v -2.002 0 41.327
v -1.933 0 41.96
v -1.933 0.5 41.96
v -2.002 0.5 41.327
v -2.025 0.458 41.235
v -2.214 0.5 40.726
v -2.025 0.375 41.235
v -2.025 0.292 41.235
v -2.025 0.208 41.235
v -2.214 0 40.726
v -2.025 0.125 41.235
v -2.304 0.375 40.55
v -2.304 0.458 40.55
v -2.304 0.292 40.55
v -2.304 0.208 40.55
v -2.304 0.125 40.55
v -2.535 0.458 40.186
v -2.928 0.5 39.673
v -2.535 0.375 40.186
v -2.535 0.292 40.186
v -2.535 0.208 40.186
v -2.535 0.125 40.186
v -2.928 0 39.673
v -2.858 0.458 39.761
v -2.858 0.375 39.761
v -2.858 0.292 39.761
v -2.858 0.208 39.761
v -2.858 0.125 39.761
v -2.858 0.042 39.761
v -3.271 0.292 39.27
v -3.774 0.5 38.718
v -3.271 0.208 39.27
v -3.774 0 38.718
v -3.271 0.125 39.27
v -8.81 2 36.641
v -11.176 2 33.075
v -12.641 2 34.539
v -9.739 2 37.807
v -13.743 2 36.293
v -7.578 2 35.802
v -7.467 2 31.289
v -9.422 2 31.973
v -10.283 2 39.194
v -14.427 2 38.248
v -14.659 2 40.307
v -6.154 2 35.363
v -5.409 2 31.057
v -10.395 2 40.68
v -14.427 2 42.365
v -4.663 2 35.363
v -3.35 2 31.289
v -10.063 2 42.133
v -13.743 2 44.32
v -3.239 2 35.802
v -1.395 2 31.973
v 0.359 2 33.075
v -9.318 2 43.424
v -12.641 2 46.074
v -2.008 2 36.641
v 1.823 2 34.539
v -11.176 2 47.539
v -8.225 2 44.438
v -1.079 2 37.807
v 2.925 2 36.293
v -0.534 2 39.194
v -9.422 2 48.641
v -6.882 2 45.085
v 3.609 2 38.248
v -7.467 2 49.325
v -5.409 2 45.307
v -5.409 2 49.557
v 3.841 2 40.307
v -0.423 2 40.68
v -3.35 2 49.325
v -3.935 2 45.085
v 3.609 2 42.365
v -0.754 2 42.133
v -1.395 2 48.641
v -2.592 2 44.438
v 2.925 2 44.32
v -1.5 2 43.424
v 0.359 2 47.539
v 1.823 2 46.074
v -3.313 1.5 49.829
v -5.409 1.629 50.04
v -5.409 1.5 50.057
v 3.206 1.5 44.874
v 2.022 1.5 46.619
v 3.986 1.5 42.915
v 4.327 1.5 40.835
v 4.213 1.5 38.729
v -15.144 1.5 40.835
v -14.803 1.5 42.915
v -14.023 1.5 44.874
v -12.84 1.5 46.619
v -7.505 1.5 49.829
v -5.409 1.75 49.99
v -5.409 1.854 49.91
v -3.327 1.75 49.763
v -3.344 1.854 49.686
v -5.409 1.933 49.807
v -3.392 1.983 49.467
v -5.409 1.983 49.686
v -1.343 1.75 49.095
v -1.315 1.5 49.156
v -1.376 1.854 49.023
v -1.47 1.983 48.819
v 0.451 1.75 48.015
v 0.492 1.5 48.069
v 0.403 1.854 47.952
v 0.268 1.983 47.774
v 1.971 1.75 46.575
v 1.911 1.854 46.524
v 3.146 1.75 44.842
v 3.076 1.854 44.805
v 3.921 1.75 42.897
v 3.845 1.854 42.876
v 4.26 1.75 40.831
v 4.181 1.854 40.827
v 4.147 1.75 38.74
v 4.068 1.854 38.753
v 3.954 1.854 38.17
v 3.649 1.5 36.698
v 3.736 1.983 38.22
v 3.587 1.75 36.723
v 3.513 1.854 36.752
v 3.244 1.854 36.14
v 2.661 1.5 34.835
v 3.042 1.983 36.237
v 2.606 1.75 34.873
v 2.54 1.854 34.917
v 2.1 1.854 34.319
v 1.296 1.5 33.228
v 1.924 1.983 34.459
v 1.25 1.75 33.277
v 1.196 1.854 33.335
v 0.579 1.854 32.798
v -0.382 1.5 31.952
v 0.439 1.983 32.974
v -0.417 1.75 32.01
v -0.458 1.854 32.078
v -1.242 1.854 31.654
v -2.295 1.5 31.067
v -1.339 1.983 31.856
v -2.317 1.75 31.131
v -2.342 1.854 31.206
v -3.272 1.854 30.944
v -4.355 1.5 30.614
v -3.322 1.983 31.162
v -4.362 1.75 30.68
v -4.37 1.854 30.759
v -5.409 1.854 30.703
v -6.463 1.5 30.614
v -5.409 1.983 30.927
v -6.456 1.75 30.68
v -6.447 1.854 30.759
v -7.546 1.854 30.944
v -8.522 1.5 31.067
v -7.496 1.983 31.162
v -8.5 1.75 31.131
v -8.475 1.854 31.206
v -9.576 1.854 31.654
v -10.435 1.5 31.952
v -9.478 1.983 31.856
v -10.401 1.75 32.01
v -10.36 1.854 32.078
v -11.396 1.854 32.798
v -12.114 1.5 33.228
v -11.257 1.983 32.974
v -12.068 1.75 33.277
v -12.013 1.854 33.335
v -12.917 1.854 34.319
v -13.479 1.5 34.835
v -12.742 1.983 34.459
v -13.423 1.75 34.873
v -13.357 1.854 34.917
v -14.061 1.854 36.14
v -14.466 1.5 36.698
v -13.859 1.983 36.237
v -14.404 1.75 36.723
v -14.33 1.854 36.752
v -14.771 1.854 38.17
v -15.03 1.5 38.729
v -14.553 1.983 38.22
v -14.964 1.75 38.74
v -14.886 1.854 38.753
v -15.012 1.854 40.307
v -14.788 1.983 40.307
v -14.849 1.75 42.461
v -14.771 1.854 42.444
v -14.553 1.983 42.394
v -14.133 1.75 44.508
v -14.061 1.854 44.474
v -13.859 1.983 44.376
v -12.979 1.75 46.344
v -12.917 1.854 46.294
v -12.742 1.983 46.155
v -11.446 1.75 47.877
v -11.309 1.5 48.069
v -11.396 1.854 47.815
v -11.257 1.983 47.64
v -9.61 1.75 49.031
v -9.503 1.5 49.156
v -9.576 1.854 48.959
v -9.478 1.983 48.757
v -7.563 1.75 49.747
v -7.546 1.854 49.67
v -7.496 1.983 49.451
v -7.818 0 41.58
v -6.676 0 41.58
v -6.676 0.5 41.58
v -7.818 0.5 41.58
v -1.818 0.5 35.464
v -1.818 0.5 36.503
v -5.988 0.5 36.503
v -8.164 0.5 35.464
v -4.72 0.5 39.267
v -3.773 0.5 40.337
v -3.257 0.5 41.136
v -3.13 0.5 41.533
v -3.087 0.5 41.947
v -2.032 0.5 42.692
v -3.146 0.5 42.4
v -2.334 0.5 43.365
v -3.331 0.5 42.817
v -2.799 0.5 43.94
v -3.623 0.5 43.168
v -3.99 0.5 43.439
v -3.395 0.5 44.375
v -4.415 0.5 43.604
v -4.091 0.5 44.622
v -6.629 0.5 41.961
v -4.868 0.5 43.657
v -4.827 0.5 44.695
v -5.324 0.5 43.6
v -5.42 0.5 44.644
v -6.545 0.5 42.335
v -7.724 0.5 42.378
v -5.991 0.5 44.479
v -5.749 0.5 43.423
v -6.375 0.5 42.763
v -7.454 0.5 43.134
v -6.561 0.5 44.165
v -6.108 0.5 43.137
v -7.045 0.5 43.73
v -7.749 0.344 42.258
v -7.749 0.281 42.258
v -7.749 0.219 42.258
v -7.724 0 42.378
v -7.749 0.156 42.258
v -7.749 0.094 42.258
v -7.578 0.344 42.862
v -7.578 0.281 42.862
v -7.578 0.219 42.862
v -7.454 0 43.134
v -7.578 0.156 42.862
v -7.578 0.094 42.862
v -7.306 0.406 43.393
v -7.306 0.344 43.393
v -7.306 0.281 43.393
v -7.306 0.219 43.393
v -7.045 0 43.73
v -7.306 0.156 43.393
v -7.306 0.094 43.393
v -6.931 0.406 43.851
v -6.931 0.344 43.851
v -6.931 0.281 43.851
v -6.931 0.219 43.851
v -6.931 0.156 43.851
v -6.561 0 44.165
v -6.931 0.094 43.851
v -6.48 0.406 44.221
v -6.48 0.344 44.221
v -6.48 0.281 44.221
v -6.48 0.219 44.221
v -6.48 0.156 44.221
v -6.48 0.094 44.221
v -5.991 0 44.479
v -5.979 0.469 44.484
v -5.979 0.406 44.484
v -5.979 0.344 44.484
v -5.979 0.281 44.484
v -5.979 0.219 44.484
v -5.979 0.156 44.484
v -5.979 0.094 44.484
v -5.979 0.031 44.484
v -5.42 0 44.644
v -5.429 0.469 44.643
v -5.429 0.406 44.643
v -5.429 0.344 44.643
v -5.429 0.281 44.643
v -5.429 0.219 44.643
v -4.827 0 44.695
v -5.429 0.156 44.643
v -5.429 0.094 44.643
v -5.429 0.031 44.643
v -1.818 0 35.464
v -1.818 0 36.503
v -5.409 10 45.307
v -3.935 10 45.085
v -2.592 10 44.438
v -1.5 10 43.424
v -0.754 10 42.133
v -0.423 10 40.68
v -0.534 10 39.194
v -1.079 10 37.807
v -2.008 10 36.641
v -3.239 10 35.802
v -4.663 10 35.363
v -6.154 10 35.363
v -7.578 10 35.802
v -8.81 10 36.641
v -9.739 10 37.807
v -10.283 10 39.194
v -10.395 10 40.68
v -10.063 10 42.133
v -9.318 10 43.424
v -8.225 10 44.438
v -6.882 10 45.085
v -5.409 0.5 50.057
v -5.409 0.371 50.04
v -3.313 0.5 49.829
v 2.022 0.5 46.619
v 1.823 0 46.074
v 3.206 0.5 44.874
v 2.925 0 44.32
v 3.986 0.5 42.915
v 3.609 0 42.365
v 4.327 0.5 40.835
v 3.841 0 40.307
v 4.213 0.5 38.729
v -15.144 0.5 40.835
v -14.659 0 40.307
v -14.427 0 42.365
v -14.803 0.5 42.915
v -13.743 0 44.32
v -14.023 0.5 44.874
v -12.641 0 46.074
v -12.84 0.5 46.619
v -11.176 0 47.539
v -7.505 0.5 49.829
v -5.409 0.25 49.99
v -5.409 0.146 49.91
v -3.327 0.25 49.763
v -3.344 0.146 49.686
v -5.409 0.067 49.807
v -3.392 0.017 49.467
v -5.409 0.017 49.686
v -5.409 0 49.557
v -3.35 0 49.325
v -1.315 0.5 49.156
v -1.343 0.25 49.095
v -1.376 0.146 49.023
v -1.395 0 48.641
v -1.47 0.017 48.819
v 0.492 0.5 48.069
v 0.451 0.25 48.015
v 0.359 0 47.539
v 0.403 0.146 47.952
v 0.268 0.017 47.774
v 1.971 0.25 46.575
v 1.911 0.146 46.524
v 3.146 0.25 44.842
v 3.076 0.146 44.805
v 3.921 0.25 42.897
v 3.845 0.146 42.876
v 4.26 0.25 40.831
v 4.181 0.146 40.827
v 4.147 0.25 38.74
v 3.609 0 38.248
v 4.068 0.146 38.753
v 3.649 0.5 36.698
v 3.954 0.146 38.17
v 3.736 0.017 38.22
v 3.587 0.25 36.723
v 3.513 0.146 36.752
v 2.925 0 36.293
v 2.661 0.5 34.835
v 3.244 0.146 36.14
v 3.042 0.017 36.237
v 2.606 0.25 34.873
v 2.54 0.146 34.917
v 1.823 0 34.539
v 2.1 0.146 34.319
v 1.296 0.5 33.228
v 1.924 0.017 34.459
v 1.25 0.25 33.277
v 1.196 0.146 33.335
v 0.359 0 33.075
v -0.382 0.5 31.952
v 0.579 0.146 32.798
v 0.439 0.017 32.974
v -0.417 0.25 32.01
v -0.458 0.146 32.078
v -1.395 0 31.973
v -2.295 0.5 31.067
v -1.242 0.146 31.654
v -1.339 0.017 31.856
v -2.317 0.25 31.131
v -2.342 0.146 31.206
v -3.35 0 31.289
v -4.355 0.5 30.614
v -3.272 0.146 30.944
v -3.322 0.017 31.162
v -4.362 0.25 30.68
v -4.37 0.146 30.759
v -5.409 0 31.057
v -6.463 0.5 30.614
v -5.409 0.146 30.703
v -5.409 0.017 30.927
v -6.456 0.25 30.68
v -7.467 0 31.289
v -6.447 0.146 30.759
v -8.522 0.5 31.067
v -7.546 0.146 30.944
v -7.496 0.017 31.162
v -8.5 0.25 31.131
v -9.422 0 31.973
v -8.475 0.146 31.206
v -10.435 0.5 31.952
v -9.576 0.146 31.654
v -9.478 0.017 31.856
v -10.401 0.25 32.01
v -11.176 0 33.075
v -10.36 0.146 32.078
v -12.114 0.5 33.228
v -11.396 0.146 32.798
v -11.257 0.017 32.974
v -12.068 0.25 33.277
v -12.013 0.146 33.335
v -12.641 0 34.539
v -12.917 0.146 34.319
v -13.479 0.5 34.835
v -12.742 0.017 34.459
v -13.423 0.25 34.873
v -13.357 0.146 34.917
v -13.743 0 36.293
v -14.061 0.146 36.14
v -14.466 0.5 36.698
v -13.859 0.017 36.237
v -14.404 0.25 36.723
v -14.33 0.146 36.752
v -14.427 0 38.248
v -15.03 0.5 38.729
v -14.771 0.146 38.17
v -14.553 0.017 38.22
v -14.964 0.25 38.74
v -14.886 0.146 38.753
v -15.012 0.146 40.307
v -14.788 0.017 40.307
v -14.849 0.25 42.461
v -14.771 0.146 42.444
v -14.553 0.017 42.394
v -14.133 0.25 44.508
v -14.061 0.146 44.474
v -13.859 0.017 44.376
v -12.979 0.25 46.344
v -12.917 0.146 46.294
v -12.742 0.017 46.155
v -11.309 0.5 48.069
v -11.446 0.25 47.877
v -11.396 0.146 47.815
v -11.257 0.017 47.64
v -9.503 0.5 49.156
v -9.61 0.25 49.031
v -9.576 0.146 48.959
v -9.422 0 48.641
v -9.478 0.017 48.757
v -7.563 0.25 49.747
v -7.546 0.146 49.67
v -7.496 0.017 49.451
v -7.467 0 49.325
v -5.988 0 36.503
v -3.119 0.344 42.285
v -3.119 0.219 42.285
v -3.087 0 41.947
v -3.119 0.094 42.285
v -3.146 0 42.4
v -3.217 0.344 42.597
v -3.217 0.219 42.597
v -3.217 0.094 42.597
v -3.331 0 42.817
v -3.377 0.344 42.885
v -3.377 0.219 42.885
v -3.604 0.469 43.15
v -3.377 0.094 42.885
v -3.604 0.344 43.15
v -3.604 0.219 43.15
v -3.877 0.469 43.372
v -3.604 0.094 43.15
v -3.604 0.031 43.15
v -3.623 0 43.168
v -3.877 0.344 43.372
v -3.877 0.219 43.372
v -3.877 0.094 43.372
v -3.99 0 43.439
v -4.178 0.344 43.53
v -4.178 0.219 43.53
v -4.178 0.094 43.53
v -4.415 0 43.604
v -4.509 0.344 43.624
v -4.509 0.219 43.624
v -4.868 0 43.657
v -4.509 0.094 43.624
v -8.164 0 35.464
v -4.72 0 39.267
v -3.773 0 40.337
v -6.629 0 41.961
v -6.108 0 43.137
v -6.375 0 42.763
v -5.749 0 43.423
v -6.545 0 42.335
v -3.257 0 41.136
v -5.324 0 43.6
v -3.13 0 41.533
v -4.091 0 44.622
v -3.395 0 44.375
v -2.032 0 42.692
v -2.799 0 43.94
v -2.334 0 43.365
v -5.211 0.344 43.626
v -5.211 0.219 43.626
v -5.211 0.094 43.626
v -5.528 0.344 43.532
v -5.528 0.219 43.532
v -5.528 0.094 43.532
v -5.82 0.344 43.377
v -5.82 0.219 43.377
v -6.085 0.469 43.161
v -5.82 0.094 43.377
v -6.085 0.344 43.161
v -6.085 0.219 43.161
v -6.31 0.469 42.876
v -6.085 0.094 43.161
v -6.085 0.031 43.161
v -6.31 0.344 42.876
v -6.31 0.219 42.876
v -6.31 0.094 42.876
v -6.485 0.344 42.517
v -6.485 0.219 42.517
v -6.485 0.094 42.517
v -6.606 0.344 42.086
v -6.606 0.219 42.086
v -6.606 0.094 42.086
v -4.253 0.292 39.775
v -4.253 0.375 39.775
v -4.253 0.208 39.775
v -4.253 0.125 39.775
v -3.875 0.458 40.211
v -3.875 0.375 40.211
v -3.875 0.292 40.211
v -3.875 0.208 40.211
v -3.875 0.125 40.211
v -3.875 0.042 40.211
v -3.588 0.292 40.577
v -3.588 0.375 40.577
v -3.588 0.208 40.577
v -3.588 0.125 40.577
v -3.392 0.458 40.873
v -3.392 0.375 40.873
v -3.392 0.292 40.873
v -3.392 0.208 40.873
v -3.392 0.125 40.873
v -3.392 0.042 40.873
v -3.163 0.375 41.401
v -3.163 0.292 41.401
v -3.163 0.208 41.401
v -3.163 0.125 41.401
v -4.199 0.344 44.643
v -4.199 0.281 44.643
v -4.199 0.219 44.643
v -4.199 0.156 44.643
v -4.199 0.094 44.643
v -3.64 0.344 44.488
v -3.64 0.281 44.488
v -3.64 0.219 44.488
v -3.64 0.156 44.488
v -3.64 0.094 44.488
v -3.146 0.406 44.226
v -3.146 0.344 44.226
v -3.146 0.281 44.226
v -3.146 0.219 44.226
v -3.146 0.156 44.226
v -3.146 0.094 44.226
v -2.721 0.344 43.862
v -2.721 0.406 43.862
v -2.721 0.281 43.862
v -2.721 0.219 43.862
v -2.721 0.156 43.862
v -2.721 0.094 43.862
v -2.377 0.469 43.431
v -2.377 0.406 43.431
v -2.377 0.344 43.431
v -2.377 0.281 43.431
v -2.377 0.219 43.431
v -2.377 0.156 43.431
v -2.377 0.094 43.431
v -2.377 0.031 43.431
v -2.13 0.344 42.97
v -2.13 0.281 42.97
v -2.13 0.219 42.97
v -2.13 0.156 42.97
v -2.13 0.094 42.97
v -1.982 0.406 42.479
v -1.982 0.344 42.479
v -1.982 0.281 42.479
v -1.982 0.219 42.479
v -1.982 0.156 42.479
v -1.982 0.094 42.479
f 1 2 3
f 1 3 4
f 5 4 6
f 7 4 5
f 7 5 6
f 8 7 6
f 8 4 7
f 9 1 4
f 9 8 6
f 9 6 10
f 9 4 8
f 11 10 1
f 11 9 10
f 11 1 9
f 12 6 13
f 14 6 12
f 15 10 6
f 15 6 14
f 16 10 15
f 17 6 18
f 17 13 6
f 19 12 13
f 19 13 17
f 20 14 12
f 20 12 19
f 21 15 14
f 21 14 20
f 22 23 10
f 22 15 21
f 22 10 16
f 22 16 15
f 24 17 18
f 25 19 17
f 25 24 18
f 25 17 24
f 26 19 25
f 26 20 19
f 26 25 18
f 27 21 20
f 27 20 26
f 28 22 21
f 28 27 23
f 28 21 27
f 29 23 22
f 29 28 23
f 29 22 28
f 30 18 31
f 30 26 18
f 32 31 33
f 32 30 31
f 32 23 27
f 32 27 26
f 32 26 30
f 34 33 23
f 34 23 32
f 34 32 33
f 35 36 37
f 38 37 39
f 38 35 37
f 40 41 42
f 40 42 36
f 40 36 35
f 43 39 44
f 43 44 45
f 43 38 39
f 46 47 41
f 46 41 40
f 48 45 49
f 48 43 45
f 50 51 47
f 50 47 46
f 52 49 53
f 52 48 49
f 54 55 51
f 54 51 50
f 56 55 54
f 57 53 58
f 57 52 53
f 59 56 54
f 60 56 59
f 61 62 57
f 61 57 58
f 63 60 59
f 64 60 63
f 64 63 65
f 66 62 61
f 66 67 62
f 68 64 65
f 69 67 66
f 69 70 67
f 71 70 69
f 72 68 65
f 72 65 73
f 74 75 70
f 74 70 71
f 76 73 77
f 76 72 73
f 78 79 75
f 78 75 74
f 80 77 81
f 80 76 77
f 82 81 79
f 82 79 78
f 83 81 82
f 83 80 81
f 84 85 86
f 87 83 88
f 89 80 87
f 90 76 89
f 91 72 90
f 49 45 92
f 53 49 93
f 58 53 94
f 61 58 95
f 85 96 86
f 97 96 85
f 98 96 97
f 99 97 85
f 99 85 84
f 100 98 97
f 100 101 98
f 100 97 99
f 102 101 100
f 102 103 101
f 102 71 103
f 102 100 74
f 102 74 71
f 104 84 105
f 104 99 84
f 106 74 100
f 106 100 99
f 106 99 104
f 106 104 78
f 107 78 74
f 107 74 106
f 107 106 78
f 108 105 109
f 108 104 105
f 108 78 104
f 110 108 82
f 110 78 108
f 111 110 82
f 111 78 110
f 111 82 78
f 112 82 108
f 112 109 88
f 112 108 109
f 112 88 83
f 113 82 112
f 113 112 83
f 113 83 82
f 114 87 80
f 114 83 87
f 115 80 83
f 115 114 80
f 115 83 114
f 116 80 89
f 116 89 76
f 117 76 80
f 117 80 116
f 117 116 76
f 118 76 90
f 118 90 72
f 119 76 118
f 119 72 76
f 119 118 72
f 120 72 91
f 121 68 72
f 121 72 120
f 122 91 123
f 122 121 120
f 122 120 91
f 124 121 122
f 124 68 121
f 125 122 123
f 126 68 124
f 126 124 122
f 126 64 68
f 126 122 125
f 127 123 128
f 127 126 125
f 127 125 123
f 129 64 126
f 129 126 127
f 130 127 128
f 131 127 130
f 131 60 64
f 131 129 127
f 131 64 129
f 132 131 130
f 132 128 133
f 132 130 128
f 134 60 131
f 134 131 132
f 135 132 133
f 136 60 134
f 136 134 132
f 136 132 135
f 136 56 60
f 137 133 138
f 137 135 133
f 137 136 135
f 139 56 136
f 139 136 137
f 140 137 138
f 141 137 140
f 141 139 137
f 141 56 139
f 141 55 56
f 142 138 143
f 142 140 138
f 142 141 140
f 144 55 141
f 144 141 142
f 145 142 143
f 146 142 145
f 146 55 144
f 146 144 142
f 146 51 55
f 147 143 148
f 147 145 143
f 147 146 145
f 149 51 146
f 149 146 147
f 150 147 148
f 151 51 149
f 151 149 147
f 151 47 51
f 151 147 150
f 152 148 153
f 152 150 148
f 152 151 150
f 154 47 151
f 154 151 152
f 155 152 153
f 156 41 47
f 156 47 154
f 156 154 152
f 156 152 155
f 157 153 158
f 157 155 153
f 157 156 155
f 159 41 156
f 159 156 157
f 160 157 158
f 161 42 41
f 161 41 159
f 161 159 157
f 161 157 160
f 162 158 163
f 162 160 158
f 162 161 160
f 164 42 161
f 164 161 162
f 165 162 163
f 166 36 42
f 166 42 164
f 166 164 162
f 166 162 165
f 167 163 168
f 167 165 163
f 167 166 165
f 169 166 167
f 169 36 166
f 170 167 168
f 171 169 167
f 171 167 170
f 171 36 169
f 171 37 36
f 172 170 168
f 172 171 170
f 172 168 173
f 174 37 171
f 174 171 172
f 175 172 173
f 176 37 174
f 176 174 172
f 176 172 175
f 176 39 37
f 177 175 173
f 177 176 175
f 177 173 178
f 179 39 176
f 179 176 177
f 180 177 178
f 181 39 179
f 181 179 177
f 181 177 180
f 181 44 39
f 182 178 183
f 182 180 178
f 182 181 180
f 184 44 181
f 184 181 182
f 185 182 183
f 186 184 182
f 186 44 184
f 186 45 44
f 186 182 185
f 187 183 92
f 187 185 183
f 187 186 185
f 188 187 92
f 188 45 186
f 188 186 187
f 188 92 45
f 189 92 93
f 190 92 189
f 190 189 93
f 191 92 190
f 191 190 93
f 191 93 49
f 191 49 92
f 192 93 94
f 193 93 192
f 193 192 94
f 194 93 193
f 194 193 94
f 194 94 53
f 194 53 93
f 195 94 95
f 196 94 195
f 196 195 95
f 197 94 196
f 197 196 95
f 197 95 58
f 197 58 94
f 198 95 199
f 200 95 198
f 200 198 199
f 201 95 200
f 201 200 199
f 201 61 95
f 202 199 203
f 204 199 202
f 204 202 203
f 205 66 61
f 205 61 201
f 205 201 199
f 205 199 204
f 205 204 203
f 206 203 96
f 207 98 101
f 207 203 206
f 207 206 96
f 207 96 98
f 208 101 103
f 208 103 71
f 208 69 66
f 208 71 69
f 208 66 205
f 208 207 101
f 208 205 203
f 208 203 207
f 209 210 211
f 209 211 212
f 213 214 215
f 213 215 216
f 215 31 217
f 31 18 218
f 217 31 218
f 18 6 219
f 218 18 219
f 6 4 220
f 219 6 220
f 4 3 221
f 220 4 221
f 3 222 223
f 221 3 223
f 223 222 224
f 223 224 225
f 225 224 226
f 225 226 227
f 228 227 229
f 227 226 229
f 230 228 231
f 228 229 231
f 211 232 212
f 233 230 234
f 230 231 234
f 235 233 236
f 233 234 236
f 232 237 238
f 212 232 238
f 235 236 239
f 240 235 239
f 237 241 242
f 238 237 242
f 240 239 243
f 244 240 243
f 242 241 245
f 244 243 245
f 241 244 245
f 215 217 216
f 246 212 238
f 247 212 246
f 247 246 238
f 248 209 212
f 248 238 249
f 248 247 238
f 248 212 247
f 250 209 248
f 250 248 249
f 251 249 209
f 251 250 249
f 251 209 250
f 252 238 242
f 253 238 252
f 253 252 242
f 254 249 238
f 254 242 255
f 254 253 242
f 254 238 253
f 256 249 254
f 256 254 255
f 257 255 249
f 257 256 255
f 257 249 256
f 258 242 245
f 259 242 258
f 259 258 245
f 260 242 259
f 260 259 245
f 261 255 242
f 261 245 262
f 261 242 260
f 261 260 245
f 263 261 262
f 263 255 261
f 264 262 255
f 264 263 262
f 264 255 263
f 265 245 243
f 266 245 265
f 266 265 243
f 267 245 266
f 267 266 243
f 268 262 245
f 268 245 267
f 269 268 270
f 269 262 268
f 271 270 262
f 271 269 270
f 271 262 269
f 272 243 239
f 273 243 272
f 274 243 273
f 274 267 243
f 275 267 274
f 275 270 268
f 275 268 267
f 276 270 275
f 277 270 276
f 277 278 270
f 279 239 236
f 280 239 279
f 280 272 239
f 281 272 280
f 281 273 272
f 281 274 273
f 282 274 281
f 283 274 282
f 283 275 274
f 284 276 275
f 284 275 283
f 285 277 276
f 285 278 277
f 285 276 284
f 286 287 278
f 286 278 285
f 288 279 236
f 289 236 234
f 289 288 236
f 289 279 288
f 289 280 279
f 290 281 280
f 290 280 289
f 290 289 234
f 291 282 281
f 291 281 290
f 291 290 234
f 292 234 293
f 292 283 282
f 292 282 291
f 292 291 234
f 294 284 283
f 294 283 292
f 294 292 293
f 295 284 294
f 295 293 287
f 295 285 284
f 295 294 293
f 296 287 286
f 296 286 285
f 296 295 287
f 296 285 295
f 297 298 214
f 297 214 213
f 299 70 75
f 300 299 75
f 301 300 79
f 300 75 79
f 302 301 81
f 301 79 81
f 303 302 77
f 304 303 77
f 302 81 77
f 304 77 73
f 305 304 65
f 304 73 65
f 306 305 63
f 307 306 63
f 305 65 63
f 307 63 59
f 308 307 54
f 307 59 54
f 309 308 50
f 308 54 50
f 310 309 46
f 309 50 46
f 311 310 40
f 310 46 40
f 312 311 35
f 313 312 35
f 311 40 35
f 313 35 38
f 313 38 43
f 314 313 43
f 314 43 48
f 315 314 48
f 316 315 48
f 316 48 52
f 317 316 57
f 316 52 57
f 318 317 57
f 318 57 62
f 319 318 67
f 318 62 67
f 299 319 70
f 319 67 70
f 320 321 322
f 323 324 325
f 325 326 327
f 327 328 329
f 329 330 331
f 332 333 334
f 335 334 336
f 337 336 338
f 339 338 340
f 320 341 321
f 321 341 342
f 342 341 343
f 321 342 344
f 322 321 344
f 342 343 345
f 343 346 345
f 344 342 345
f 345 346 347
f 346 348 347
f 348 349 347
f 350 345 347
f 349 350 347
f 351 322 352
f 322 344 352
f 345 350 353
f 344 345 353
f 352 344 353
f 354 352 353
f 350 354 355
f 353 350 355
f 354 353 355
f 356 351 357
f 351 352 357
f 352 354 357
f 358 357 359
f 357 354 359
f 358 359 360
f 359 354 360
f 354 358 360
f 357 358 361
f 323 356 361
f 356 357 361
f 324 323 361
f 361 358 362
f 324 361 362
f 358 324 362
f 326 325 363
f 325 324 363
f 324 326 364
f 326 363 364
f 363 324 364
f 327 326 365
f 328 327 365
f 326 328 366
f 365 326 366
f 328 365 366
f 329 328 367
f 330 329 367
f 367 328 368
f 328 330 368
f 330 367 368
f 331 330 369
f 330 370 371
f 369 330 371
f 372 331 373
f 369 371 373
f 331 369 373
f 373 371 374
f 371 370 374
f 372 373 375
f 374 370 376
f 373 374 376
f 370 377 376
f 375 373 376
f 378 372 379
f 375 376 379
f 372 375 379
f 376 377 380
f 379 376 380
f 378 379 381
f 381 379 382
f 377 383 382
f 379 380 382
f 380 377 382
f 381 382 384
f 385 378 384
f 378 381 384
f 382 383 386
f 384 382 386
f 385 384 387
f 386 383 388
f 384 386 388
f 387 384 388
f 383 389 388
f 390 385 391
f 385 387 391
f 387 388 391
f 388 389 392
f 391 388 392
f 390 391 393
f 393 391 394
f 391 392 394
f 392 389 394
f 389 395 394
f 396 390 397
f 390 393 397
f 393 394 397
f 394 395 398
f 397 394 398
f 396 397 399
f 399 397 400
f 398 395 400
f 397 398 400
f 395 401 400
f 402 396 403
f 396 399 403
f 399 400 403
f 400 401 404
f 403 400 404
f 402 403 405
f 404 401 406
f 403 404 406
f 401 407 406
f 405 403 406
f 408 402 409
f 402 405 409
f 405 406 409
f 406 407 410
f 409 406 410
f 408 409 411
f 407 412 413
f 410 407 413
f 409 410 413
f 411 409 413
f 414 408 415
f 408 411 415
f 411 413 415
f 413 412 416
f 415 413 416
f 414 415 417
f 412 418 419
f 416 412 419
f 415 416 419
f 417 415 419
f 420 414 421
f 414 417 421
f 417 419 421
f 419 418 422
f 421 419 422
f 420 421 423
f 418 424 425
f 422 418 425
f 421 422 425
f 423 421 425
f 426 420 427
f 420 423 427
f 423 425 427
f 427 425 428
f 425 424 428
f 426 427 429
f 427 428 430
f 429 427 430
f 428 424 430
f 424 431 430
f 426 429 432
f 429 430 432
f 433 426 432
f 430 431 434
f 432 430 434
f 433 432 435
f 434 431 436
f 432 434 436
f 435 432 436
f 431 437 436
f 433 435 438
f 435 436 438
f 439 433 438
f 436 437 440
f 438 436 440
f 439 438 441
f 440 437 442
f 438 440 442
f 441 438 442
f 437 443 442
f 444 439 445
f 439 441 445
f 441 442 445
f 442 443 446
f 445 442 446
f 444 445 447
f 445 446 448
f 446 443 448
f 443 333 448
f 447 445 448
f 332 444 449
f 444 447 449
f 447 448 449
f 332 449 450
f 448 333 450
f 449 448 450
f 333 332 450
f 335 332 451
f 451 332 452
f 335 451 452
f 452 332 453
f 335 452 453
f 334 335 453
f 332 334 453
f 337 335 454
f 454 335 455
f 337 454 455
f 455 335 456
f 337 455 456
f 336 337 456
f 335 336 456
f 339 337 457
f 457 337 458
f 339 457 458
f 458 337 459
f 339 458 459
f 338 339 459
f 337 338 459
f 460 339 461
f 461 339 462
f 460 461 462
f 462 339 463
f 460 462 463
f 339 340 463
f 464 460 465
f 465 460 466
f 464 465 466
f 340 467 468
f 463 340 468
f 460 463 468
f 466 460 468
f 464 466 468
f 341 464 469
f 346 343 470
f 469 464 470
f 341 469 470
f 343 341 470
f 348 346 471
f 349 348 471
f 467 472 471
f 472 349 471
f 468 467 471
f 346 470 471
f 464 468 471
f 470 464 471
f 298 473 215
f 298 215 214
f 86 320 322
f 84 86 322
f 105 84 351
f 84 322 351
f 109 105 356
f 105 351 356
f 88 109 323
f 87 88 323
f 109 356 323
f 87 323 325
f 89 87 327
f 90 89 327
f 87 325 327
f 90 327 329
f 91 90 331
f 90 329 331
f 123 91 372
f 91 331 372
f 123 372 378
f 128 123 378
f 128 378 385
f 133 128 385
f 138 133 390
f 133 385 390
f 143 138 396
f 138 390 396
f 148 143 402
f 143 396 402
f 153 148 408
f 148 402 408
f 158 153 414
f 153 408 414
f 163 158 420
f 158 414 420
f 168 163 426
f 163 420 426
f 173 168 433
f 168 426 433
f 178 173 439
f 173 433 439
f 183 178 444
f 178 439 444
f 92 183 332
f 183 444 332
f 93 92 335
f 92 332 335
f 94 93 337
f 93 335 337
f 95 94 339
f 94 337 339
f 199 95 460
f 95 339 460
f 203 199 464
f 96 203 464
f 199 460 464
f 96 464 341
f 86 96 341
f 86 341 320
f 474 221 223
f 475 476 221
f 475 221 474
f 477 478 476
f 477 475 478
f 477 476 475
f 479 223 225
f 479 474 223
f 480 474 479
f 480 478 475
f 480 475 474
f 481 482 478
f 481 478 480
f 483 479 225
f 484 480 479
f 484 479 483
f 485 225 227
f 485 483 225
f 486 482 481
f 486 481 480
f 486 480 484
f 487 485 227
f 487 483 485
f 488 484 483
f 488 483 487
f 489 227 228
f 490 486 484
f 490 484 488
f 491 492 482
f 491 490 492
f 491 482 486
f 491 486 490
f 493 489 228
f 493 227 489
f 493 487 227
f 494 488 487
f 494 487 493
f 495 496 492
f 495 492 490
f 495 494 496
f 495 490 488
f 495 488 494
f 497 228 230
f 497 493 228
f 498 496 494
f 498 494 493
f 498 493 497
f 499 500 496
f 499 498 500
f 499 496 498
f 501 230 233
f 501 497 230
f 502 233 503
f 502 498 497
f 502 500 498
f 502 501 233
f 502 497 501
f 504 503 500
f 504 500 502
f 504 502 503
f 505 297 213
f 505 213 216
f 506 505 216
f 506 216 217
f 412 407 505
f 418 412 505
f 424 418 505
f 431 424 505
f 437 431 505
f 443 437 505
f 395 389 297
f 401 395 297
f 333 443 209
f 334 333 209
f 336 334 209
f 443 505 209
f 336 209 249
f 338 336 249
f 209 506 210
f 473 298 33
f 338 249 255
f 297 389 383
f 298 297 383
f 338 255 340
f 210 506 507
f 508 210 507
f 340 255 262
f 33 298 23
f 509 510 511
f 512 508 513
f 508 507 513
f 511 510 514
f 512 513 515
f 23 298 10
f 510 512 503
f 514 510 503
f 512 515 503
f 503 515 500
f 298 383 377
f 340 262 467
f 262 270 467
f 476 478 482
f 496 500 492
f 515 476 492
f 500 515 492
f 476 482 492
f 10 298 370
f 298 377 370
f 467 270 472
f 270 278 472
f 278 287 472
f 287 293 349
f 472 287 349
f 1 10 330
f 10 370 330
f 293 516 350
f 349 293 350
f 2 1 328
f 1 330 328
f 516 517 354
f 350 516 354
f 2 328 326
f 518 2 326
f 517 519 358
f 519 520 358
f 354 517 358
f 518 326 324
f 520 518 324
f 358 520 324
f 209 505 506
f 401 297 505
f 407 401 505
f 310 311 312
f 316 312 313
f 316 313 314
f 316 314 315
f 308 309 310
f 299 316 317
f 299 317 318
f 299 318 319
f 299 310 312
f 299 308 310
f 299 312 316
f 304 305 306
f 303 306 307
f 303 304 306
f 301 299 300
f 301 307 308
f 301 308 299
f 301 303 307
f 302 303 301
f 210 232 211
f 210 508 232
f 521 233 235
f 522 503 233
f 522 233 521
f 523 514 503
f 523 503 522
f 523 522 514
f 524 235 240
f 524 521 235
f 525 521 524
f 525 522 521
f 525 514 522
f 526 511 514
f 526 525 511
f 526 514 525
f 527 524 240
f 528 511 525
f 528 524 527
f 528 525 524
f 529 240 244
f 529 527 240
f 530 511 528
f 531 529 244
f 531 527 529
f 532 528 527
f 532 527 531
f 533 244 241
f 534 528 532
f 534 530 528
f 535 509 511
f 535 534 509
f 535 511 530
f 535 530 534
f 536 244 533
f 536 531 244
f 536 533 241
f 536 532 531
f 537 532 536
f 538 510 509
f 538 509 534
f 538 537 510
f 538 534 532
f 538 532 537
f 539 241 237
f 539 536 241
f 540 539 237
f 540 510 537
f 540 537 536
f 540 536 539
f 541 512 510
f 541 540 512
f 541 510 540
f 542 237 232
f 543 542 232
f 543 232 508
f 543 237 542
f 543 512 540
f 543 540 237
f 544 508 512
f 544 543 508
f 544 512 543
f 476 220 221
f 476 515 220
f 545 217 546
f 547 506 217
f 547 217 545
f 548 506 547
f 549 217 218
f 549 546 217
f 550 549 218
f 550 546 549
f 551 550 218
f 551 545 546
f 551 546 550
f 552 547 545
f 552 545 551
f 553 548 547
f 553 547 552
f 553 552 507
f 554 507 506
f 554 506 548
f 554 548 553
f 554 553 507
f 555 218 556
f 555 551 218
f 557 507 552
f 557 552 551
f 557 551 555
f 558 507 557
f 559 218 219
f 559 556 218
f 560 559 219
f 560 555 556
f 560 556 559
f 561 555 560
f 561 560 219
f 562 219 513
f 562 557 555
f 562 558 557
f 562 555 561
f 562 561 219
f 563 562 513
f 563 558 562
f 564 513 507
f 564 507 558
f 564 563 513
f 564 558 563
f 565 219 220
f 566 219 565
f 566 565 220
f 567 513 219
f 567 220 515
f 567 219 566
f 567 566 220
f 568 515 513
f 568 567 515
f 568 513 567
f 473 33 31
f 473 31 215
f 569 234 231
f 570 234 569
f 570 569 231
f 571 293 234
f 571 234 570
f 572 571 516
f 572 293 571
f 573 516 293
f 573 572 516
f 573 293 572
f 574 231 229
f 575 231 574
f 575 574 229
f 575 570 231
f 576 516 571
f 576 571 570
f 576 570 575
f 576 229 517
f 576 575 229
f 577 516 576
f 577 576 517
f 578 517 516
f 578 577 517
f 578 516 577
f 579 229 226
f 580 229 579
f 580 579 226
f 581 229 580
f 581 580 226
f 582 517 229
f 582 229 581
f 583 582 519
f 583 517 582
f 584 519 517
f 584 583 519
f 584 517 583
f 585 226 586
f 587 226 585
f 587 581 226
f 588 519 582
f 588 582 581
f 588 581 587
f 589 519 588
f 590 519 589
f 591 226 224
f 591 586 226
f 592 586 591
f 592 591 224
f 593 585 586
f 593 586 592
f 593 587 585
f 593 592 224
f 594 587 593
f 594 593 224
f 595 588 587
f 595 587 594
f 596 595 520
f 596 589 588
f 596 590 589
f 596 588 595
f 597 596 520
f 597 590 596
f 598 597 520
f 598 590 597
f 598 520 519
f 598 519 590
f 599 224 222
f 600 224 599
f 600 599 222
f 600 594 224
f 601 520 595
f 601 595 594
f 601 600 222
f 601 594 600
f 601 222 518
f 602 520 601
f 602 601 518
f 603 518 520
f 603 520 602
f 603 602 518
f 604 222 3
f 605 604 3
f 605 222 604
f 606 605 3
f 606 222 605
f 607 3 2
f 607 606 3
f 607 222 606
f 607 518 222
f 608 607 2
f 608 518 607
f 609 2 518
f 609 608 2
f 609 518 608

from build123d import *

# Parameters (mm, degrees)
SKETCH1_R           = 9.75
BOSS_EXTRUDE5_DEPTH = 2
SKETCH4_R           = 5
BOSS_EXTRUDE6_DEPTH = 8
CUT_EXTRUDE2_DEPTH  = 0.5
FILLET1_R           = 0.5


with BuildPart() as part:
    # Sketch1 → Boss-Extrude5 (new body)
    with BuildSketch(Plane(origin=(0, 0, 0), x_dir=(1, 0, 0), z_dir=(0, 1, 0))):
        with Locations(Location((-5.408676197, -40.3067379, 0), (0, 0, 270))):
            Circle(SKETCH1_R)
    extrude(amount=BOSS_EXTRUDE5_DEPTH)

    # Sketch4 → Boss-Extrude6 (add)
    with BuildSketch(Plane(origin=(0, 2, 0), x_dir=(1, 0, 0), z_dir=(0, 1, 0))):
        with Locations(Location((-5.408676197, -40.3067379, 0), (0, 0, 270))):
            Circle(SKETCH4_R)
    extrude(amount=BOSS_EXTRUDE6_DEPTH)

    # Sketch5 → Cut-Extrude2 (cut)
    with BuildSketch(Plane.XZ):
        with BuildLine():
            Line((-6.676445146, 41.579675489), (-7.817671107, 41.579675489))
            add(Edge.make_bspline(
                [(-7.817671107, 41.579675489), (-7.812310426, 41.695801368), (-7.801825667, 41.922927653), (-7.755267935, 42.253876027), (-7.679847726, 42.565713816), (-7.584651501, 42.861084573), (-7.45766239, 43.136296006), (-7.311142358, 43.396145756), (-7.134259014, 43.635187883), (-6.934371171, 43.853800531), (-6.717385859, 44.05241863), (-6.484125633, 44.223683245), (-6.238533308, 44.369625985), (-5.980560591, 44.488716228), (-5.70970227, 44.580925529), (-5.426730394, 44.648023926), (-5.13074225, 44.688382018), (-4.928974632, 44.692813499), (-4.826685531, 44.695060105)],
                knots=[0, 0, 0, 0, 1.154964179, 2.258951466, 3.315045469, 4.34063582, 5.337653555, 6.322213479, 7.300594401, 8.285733883, 9.262436119, 10.219305053, 11.156568068, 12.097250375, 13.037875795, 13.995471444, 14.983774372, 16, 16, 16, 16], degree=3))
            add(Edge.make_bspline(
                [(-4.826685531, 44.695060105), (-4.719588621, 44.692869366), (-4.50943487, 44.68857053), (-4.203400393, 44.648117964), (-3.913766774, 44.58288823), (-3.640449207, 44.493807864), (-3.383945659, 44.374862374), (-3.14375032, 44.231427232), (-2.922172064, 44.05902337), (-2.717602692, 43.866114214), (-2.536915038, 43.653912553), (-2.373716977, 43.435744039), (-2.238817979, 43.207183965), (-2.125806623, 42.972405889), (-2.038842603, 42.729482892), (-1.977428884, 42.479403561), (-1.940616475, 42.221997964), (-1.935591973, 42.047942984), (-1.933055723, 41.960084143)],
                knots=[0, 0, 0, 0, 1.156722346, 2.269809107, 3.328396062, 4.361258308, 5.3694338, 6.377253737, 7.377324894, 8.397019439, 9.4098266, 10.385180797, 11.337325354, 12.27255833, 13.196816462, 14.119704983, 15.050871513, 16, 16, 16, 16], degree=3))
            add(Edge.make_bspline(
                [(-1.933055723, 41.960084143), (-1.937670931, 41.837184043), (-1.946838122, 41.593067475), (-2.017428332, 41.231911022), (-2.136098747, 40.882386988), (-2.273174428, 40.597782754), (-2.411809943, 40.367733096), (-2.539034806, 40.177847763), (-2.688491104, 39.972524075), (-2.863384002, 39.753136485), (-3.056759049, 39.514665319), (-3.276297862, 39.263262394), (-3.515205381, 38.99383788), (-3.685590507, 38.812419869), (-3.773800915, 38.718497605)],
                knots=[0, 0, 0, 0, 1.155755081, 2.295677249, 3.447123235, 4.6205014, 5.259503175, 5.973005395, 6.77029923, 7.648035671, 8.612336498, 9.658570495, 10.787814065, 12, 12, 12, 12], degree=3))
            Line((-3.773800915, 38.718497605), (-5.987743223, 36.502752412))
            Line((-5.987743223, 36.502752412), (-1.817671107, 36.502752412))
            Line((-1.817671107, 36.502752412), (-1.817671107, 35.464290874))
            Line((-1.817671107, 35.464290874), (-8.163824954, 35.464290874))
            Line((-8.163824954, 35.464290874), (-4.720315338, 39.266574528))
            add(Edge.make_bspline(
                [(-4.720315338, 39.266574528), (-4.638295504, 39.354047762), (-4.480897943, 39.521910498), (-4.259068364, 39.767634589), (-4.058928423, 39.994802676), (-3.879411097, 40.203250768), (-3.725217211, 40.395780628), (-3.592198644, 40.569559806), (-3.48186119, 40.72540892), (-3.367275219, 40.908856301), (-3.253732275, 41.128759827), (-3.157143346, 41.39701125), (-3.099185258, 41.670954142), (-3.090998341, 41.855248913), (-3.086901877, 41.947463951)],
                knots=[0, 0, 0, 0, 1.341560447, 2.574479018, 3.703506985, 4.728875774, 5.651874962, 6.462761537, 7.177175968, 7.787249671, 8.88179658, 9.938774664, 10.968630673, 12, 12, 12, 12], degree=3))
            add(Edge.make_bspline(
                [(-3.086901877, 41.947463951), (-3.087911417, 42.004670669), (-3.089908998, 42.117865747), (-3.117142724, 42.283626365), (-3.155506319, 42.444404941), (-3.214841381, 42.597616639), (-3.286329214, 42.746275734), (-3.375747774, 42.888460482), (-3.483123565, 43.022851966), (-3.602569027, 43.15247391), (-3.734678848, 43.269507844), (-3.874218391, 43.374470164), (-4.022903654, 43.459713223), (-4.176669359, 43.53425977), (-4.340295405, 43.587108395), (-4.509759668, 43.626456912), (-4.686392781, 43.653714425), (-4.806748776, 43.655624226), (-4.868151877, 43.656598566)],
                knots=[0, 0, 0, 0, 0.999432927, 1.977580462, 2.931018689, 3.885672852, 4.844657058, 5.812871023, 6.815890212, 7.849665183, 8.891901864, 9.898878619, 10.897592748, 11.885014695, 12.882178885, 13.896915602, 14.927050508, 16, 16, 16, 16], degree=3))
            add(Edge.make_bspline(
                [(-4.868151877, 43.656598566), (-4.926527495, 43.655401271), (-5.041367662, 43.653045877), (-5.210498233, 43.628743667), (-5.372842642, 43.58917489), (-5.528948546, 43.534289387), (-5.679946595, 43.466576563), (-5.822144632, 43.378854732), (-5.957866841, 43.276807213), (-6.088907502, 43.162274235), (-6.208169616, 43.027904249), (-6.314840719, 42.87528957), (-6.409035513, 42.704263904), (-6.489548923, 42.51512644), (-6.55627432, 42.307380975), (-6.609801194, 42.081280118), (-6.651182642, 41.836725471), (-6.667868533, 41.66694389), (-6.676445146, 41.579675489)],
                knots=[0, 0, 0, 0, 0.911540883, 1.79324023, 2.663162255, 3.518366492, 4.375475705, 5.243419306, 6.122264358, 7.02676621, 7.957780629, 8.921596253, 9.930241338, 11.002848587, 12.128200329, 13.335197372, 14.630280975, 16, 16, 16, 16], degree=3))
        make_face()
    extrude(amount=-CUT_EXTRUDE2_DEPTH, mode=Mode.SUBTRACT)

    # Fillet1
    fillet1_edges = [part.edges().sort_by_distance(p)[0] for p in [
        (-5.408676197, 0, 30.5567379),
        (-5.408676197, 2, 30.5567379),
    ]]
    fillet(fillet1_edges, radius=FILLET1_R)


solid = part.part
